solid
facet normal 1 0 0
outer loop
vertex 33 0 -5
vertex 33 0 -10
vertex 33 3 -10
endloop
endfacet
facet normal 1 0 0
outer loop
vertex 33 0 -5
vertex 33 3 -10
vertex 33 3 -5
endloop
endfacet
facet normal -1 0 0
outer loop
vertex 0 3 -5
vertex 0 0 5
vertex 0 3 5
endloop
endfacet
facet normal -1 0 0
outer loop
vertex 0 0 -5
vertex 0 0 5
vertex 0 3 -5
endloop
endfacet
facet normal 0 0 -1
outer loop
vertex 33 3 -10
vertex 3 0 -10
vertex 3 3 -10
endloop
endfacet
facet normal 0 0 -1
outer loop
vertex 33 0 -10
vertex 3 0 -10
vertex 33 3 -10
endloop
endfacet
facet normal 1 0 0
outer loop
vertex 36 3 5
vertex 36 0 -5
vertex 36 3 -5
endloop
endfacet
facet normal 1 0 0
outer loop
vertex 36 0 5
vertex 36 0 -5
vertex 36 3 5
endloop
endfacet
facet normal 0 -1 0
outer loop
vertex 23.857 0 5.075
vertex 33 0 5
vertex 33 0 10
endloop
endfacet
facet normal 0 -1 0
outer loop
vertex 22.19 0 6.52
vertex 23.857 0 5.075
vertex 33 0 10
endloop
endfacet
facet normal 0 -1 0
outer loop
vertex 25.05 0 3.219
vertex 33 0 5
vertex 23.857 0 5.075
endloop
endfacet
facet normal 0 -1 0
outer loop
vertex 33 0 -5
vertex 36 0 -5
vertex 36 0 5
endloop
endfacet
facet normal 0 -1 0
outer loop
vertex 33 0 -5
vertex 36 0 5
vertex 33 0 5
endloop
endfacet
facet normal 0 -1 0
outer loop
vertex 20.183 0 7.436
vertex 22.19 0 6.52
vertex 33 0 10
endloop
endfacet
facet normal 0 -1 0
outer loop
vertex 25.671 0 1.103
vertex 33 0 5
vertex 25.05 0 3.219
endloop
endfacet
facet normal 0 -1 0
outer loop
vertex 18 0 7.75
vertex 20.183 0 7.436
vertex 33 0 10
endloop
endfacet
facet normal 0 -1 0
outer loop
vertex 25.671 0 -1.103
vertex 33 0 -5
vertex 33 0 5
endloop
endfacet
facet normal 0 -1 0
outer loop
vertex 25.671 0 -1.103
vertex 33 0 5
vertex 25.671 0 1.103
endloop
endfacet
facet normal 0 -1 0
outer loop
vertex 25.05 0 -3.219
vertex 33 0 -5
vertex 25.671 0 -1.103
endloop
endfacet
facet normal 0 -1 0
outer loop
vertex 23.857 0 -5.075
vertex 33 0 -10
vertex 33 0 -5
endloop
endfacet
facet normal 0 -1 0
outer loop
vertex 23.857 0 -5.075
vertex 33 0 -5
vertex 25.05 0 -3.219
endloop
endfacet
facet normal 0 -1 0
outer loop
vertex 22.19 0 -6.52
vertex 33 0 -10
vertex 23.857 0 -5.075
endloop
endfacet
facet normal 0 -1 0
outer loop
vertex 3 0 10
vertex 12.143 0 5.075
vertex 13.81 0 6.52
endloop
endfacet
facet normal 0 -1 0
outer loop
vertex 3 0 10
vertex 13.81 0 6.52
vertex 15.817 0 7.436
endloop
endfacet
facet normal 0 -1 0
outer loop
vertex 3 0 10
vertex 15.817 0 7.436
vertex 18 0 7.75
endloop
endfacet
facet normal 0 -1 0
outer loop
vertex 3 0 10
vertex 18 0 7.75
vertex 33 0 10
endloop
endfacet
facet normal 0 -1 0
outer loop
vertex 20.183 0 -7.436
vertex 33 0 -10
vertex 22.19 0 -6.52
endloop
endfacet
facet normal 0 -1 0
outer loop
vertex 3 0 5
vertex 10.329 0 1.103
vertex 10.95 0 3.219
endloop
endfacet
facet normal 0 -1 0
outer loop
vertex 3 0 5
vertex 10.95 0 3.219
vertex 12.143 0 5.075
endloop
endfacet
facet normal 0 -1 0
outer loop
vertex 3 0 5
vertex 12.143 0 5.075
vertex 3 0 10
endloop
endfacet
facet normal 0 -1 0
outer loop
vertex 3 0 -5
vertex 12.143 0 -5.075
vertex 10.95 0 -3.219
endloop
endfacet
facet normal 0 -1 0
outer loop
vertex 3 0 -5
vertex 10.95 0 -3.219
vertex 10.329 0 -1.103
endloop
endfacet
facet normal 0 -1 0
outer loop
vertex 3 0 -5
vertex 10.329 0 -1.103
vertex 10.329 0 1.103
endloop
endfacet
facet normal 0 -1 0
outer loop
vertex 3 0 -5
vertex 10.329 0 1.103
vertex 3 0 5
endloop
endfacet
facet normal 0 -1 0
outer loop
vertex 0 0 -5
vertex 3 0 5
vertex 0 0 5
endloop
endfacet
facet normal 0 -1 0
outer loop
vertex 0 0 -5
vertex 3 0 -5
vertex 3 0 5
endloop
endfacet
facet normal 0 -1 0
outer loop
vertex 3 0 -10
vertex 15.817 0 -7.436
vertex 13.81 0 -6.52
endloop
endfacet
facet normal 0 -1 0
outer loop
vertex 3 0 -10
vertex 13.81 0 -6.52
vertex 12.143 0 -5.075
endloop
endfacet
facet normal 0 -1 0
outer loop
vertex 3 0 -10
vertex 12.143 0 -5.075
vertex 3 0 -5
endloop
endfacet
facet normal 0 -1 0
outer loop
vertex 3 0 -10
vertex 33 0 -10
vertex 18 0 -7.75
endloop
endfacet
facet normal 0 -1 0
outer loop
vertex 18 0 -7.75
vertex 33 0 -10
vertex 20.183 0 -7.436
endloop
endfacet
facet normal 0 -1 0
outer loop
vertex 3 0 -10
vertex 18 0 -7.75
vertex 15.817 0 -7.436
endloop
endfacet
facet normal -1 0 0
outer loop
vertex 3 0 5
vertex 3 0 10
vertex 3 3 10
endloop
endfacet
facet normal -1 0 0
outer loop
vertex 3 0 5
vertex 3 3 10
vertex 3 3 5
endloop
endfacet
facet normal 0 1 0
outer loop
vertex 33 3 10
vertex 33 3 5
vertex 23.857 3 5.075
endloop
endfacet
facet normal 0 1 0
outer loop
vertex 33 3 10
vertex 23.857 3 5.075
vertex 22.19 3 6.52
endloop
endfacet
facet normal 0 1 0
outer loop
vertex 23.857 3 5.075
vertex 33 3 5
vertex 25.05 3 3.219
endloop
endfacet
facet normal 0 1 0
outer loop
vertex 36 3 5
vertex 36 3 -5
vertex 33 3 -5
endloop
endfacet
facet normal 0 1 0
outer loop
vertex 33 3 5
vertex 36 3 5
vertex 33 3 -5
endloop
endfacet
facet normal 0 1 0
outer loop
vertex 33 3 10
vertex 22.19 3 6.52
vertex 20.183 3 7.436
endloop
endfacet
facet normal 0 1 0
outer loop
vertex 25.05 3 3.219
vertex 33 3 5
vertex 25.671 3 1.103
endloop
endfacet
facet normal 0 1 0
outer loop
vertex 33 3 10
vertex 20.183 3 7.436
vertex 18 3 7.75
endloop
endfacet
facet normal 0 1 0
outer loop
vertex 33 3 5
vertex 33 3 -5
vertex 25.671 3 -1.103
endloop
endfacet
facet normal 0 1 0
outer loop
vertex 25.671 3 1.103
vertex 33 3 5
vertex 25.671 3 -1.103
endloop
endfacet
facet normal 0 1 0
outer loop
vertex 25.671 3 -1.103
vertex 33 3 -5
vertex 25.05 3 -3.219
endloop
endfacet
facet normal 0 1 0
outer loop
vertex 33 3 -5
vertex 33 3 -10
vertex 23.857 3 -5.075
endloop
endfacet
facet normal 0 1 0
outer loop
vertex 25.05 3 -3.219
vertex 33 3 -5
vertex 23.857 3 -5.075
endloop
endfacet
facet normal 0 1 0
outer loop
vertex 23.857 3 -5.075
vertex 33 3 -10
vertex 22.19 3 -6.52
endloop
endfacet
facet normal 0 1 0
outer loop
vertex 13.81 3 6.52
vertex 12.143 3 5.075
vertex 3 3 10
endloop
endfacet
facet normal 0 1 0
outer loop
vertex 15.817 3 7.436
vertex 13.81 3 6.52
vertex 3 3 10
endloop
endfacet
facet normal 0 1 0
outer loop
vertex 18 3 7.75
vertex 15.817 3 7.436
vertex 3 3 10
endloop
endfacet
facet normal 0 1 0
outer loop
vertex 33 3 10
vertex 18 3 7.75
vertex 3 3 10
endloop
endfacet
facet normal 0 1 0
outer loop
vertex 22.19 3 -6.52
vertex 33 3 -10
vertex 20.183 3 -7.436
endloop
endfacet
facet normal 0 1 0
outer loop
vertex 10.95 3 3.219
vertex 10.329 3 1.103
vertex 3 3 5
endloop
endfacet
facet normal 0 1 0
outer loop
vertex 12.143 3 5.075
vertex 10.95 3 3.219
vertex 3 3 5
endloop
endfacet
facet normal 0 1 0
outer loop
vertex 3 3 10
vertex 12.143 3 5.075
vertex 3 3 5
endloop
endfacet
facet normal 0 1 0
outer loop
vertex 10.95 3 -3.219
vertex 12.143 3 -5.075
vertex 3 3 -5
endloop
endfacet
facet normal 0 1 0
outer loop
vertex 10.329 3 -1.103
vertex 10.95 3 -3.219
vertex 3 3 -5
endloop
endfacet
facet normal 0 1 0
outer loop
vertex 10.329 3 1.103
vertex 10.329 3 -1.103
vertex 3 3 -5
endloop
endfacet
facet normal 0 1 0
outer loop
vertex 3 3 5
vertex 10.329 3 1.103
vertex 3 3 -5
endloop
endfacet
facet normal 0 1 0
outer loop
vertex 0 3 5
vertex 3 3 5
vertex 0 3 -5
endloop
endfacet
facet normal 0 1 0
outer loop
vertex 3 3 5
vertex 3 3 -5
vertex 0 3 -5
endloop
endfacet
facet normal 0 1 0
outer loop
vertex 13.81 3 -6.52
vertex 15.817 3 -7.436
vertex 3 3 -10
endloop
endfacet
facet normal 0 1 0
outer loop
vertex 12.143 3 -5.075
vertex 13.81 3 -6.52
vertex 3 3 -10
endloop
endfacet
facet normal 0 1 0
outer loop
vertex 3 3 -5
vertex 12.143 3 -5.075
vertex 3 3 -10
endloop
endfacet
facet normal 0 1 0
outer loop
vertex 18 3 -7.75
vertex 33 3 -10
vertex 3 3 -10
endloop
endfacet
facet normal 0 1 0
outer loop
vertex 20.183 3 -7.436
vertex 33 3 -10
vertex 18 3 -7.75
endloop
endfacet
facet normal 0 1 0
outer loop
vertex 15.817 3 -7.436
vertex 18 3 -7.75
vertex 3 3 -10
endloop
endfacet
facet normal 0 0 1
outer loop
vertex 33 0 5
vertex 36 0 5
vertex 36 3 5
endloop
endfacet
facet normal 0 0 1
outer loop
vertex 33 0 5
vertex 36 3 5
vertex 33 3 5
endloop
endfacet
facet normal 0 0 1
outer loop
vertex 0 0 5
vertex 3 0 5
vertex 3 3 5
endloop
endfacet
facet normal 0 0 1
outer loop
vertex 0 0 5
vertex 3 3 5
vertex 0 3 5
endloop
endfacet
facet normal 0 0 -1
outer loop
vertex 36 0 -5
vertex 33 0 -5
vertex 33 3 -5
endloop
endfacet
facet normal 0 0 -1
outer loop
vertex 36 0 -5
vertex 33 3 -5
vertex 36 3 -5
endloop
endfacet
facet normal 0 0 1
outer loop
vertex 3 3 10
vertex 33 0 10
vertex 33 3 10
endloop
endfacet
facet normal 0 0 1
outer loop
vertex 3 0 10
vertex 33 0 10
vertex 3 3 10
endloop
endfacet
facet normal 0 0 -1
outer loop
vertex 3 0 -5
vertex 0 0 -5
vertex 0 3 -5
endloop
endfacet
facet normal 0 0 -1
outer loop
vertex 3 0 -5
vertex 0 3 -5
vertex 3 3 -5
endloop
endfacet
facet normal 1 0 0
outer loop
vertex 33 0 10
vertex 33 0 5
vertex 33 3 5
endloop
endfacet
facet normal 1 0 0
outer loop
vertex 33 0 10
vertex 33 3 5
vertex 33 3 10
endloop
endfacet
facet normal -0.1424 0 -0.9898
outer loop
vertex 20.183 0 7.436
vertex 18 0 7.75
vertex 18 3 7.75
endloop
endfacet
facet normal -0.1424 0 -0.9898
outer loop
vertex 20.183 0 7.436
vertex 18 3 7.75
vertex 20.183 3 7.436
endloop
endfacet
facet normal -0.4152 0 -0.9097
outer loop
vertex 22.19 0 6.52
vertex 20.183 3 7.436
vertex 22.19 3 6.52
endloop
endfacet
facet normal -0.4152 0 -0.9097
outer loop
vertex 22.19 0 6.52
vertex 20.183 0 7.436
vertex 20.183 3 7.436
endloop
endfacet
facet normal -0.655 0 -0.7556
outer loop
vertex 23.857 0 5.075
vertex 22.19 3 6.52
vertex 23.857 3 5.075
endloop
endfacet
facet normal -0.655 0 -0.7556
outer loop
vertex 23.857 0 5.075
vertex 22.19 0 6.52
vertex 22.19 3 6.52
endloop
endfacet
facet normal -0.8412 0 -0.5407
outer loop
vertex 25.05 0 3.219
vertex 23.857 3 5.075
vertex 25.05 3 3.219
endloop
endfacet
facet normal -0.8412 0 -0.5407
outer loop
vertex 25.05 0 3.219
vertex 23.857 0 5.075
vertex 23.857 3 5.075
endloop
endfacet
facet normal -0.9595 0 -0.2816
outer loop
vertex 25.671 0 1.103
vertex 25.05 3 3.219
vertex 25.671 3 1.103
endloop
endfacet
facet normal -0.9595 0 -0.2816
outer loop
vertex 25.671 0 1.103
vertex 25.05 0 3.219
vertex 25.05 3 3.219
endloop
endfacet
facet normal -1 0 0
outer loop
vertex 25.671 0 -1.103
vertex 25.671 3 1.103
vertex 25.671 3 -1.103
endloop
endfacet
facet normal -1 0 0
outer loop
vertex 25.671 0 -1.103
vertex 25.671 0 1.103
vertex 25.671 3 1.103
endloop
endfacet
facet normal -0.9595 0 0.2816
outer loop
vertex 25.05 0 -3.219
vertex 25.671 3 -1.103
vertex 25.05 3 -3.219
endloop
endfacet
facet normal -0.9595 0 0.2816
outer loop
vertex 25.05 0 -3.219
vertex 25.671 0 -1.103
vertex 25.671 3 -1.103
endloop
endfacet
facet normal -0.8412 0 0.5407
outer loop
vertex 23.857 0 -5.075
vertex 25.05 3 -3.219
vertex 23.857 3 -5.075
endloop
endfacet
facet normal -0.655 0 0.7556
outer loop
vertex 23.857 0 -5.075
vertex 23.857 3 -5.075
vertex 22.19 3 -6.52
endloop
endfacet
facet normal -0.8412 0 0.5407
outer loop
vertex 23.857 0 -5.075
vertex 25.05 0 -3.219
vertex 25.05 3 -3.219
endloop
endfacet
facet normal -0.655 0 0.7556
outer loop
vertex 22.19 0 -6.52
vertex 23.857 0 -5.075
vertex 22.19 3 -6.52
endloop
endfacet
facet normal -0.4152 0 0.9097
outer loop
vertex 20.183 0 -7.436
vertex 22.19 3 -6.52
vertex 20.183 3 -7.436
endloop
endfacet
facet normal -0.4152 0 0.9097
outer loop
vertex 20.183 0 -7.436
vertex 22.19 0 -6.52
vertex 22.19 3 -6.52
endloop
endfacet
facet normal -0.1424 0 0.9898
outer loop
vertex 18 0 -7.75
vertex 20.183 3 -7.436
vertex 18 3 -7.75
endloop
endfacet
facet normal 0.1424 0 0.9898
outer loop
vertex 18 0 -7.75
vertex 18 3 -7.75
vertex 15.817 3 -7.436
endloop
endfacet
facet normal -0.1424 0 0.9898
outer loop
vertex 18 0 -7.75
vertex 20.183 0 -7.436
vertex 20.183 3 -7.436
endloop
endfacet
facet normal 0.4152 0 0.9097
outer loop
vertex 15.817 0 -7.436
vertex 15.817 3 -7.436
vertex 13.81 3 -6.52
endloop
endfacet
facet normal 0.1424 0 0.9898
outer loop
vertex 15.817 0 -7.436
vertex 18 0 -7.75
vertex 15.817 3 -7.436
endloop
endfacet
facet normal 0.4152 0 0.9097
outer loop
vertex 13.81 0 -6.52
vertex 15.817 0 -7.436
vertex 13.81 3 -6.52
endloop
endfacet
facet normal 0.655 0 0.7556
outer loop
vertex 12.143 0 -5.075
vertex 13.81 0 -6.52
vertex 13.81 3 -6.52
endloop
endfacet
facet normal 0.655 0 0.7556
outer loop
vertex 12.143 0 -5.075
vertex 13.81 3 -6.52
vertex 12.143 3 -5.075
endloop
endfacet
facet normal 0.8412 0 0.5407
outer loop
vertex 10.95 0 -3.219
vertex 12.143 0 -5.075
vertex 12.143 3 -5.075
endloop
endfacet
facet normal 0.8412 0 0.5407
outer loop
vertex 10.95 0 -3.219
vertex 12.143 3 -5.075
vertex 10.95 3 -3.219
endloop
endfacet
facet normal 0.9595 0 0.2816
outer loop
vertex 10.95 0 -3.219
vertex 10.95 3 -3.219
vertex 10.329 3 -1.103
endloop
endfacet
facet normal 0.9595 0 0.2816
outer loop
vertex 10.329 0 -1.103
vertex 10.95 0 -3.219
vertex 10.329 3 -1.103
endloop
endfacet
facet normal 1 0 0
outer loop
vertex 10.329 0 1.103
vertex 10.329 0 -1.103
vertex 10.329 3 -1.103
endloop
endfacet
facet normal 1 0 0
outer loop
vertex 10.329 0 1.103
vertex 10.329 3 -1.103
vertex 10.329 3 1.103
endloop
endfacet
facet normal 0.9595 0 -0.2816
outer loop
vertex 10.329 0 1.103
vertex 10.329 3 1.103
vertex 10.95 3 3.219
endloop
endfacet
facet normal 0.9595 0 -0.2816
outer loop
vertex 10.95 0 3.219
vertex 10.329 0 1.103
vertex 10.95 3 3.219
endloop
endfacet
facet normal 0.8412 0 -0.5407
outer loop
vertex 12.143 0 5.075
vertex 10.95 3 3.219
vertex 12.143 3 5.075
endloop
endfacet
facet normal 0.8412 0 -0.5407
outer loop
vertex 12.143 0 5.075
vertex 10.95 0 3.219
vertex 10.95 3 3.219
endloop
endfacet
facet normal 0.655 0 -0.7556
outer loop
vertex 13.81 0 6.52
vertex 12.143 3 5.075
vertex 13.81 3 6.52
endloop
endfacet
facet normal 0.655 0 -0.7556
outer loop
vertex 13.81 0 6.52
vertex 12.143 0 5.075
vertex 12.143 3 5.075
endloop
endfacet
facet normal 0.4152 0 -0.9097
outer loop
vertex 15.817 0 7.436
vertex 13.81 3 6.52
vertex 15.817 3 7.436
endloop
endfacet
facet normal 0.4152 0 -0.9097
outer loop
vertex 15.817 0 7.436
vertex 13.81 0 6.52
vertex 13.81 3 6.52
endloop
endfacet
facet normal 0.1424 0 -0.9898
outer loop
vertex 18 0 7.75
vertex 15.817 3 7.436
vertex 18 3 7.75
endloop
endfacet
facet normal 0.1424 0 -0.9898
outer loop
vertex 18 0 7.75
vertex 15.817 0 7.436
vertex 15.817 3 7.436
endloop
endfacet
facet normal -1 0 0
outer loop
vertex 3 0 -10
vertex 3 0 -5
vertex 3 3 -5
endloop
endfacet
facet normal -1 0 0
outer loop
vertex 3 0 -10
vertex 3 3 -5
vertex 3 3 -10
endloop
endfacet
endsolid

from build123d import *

# Parameters (mm, degrees)
CROQUIS1_R              = 7.75
SALIENTE_EXTRUIR1_DEPTH = 3


with BuildPart() as part:
    # Croquis1 → Saliente-Extruir1 (new body)
    with BuildSketch(Plane(origin=(0, 0, 0), x_dir=(1, 0, 0), z_dir=(0, 1, 0))):
        Polygon((0, -5), (0, 5), (3, 5), (3, 10), (33, 10), (33, 5), (36, 5), (36, -5), (33, -5), (33, -10), (3, -10), (3, -5), align=None)
        with Locations(Location((18, 0, 0), (0, 0, 270))):
            Circle(CROQUIS1_R, mode=Mode.SUBTRACT)
    extrude(amount=SALIENTE_EXTRUIR1_DEPTH)


solid = part.part
